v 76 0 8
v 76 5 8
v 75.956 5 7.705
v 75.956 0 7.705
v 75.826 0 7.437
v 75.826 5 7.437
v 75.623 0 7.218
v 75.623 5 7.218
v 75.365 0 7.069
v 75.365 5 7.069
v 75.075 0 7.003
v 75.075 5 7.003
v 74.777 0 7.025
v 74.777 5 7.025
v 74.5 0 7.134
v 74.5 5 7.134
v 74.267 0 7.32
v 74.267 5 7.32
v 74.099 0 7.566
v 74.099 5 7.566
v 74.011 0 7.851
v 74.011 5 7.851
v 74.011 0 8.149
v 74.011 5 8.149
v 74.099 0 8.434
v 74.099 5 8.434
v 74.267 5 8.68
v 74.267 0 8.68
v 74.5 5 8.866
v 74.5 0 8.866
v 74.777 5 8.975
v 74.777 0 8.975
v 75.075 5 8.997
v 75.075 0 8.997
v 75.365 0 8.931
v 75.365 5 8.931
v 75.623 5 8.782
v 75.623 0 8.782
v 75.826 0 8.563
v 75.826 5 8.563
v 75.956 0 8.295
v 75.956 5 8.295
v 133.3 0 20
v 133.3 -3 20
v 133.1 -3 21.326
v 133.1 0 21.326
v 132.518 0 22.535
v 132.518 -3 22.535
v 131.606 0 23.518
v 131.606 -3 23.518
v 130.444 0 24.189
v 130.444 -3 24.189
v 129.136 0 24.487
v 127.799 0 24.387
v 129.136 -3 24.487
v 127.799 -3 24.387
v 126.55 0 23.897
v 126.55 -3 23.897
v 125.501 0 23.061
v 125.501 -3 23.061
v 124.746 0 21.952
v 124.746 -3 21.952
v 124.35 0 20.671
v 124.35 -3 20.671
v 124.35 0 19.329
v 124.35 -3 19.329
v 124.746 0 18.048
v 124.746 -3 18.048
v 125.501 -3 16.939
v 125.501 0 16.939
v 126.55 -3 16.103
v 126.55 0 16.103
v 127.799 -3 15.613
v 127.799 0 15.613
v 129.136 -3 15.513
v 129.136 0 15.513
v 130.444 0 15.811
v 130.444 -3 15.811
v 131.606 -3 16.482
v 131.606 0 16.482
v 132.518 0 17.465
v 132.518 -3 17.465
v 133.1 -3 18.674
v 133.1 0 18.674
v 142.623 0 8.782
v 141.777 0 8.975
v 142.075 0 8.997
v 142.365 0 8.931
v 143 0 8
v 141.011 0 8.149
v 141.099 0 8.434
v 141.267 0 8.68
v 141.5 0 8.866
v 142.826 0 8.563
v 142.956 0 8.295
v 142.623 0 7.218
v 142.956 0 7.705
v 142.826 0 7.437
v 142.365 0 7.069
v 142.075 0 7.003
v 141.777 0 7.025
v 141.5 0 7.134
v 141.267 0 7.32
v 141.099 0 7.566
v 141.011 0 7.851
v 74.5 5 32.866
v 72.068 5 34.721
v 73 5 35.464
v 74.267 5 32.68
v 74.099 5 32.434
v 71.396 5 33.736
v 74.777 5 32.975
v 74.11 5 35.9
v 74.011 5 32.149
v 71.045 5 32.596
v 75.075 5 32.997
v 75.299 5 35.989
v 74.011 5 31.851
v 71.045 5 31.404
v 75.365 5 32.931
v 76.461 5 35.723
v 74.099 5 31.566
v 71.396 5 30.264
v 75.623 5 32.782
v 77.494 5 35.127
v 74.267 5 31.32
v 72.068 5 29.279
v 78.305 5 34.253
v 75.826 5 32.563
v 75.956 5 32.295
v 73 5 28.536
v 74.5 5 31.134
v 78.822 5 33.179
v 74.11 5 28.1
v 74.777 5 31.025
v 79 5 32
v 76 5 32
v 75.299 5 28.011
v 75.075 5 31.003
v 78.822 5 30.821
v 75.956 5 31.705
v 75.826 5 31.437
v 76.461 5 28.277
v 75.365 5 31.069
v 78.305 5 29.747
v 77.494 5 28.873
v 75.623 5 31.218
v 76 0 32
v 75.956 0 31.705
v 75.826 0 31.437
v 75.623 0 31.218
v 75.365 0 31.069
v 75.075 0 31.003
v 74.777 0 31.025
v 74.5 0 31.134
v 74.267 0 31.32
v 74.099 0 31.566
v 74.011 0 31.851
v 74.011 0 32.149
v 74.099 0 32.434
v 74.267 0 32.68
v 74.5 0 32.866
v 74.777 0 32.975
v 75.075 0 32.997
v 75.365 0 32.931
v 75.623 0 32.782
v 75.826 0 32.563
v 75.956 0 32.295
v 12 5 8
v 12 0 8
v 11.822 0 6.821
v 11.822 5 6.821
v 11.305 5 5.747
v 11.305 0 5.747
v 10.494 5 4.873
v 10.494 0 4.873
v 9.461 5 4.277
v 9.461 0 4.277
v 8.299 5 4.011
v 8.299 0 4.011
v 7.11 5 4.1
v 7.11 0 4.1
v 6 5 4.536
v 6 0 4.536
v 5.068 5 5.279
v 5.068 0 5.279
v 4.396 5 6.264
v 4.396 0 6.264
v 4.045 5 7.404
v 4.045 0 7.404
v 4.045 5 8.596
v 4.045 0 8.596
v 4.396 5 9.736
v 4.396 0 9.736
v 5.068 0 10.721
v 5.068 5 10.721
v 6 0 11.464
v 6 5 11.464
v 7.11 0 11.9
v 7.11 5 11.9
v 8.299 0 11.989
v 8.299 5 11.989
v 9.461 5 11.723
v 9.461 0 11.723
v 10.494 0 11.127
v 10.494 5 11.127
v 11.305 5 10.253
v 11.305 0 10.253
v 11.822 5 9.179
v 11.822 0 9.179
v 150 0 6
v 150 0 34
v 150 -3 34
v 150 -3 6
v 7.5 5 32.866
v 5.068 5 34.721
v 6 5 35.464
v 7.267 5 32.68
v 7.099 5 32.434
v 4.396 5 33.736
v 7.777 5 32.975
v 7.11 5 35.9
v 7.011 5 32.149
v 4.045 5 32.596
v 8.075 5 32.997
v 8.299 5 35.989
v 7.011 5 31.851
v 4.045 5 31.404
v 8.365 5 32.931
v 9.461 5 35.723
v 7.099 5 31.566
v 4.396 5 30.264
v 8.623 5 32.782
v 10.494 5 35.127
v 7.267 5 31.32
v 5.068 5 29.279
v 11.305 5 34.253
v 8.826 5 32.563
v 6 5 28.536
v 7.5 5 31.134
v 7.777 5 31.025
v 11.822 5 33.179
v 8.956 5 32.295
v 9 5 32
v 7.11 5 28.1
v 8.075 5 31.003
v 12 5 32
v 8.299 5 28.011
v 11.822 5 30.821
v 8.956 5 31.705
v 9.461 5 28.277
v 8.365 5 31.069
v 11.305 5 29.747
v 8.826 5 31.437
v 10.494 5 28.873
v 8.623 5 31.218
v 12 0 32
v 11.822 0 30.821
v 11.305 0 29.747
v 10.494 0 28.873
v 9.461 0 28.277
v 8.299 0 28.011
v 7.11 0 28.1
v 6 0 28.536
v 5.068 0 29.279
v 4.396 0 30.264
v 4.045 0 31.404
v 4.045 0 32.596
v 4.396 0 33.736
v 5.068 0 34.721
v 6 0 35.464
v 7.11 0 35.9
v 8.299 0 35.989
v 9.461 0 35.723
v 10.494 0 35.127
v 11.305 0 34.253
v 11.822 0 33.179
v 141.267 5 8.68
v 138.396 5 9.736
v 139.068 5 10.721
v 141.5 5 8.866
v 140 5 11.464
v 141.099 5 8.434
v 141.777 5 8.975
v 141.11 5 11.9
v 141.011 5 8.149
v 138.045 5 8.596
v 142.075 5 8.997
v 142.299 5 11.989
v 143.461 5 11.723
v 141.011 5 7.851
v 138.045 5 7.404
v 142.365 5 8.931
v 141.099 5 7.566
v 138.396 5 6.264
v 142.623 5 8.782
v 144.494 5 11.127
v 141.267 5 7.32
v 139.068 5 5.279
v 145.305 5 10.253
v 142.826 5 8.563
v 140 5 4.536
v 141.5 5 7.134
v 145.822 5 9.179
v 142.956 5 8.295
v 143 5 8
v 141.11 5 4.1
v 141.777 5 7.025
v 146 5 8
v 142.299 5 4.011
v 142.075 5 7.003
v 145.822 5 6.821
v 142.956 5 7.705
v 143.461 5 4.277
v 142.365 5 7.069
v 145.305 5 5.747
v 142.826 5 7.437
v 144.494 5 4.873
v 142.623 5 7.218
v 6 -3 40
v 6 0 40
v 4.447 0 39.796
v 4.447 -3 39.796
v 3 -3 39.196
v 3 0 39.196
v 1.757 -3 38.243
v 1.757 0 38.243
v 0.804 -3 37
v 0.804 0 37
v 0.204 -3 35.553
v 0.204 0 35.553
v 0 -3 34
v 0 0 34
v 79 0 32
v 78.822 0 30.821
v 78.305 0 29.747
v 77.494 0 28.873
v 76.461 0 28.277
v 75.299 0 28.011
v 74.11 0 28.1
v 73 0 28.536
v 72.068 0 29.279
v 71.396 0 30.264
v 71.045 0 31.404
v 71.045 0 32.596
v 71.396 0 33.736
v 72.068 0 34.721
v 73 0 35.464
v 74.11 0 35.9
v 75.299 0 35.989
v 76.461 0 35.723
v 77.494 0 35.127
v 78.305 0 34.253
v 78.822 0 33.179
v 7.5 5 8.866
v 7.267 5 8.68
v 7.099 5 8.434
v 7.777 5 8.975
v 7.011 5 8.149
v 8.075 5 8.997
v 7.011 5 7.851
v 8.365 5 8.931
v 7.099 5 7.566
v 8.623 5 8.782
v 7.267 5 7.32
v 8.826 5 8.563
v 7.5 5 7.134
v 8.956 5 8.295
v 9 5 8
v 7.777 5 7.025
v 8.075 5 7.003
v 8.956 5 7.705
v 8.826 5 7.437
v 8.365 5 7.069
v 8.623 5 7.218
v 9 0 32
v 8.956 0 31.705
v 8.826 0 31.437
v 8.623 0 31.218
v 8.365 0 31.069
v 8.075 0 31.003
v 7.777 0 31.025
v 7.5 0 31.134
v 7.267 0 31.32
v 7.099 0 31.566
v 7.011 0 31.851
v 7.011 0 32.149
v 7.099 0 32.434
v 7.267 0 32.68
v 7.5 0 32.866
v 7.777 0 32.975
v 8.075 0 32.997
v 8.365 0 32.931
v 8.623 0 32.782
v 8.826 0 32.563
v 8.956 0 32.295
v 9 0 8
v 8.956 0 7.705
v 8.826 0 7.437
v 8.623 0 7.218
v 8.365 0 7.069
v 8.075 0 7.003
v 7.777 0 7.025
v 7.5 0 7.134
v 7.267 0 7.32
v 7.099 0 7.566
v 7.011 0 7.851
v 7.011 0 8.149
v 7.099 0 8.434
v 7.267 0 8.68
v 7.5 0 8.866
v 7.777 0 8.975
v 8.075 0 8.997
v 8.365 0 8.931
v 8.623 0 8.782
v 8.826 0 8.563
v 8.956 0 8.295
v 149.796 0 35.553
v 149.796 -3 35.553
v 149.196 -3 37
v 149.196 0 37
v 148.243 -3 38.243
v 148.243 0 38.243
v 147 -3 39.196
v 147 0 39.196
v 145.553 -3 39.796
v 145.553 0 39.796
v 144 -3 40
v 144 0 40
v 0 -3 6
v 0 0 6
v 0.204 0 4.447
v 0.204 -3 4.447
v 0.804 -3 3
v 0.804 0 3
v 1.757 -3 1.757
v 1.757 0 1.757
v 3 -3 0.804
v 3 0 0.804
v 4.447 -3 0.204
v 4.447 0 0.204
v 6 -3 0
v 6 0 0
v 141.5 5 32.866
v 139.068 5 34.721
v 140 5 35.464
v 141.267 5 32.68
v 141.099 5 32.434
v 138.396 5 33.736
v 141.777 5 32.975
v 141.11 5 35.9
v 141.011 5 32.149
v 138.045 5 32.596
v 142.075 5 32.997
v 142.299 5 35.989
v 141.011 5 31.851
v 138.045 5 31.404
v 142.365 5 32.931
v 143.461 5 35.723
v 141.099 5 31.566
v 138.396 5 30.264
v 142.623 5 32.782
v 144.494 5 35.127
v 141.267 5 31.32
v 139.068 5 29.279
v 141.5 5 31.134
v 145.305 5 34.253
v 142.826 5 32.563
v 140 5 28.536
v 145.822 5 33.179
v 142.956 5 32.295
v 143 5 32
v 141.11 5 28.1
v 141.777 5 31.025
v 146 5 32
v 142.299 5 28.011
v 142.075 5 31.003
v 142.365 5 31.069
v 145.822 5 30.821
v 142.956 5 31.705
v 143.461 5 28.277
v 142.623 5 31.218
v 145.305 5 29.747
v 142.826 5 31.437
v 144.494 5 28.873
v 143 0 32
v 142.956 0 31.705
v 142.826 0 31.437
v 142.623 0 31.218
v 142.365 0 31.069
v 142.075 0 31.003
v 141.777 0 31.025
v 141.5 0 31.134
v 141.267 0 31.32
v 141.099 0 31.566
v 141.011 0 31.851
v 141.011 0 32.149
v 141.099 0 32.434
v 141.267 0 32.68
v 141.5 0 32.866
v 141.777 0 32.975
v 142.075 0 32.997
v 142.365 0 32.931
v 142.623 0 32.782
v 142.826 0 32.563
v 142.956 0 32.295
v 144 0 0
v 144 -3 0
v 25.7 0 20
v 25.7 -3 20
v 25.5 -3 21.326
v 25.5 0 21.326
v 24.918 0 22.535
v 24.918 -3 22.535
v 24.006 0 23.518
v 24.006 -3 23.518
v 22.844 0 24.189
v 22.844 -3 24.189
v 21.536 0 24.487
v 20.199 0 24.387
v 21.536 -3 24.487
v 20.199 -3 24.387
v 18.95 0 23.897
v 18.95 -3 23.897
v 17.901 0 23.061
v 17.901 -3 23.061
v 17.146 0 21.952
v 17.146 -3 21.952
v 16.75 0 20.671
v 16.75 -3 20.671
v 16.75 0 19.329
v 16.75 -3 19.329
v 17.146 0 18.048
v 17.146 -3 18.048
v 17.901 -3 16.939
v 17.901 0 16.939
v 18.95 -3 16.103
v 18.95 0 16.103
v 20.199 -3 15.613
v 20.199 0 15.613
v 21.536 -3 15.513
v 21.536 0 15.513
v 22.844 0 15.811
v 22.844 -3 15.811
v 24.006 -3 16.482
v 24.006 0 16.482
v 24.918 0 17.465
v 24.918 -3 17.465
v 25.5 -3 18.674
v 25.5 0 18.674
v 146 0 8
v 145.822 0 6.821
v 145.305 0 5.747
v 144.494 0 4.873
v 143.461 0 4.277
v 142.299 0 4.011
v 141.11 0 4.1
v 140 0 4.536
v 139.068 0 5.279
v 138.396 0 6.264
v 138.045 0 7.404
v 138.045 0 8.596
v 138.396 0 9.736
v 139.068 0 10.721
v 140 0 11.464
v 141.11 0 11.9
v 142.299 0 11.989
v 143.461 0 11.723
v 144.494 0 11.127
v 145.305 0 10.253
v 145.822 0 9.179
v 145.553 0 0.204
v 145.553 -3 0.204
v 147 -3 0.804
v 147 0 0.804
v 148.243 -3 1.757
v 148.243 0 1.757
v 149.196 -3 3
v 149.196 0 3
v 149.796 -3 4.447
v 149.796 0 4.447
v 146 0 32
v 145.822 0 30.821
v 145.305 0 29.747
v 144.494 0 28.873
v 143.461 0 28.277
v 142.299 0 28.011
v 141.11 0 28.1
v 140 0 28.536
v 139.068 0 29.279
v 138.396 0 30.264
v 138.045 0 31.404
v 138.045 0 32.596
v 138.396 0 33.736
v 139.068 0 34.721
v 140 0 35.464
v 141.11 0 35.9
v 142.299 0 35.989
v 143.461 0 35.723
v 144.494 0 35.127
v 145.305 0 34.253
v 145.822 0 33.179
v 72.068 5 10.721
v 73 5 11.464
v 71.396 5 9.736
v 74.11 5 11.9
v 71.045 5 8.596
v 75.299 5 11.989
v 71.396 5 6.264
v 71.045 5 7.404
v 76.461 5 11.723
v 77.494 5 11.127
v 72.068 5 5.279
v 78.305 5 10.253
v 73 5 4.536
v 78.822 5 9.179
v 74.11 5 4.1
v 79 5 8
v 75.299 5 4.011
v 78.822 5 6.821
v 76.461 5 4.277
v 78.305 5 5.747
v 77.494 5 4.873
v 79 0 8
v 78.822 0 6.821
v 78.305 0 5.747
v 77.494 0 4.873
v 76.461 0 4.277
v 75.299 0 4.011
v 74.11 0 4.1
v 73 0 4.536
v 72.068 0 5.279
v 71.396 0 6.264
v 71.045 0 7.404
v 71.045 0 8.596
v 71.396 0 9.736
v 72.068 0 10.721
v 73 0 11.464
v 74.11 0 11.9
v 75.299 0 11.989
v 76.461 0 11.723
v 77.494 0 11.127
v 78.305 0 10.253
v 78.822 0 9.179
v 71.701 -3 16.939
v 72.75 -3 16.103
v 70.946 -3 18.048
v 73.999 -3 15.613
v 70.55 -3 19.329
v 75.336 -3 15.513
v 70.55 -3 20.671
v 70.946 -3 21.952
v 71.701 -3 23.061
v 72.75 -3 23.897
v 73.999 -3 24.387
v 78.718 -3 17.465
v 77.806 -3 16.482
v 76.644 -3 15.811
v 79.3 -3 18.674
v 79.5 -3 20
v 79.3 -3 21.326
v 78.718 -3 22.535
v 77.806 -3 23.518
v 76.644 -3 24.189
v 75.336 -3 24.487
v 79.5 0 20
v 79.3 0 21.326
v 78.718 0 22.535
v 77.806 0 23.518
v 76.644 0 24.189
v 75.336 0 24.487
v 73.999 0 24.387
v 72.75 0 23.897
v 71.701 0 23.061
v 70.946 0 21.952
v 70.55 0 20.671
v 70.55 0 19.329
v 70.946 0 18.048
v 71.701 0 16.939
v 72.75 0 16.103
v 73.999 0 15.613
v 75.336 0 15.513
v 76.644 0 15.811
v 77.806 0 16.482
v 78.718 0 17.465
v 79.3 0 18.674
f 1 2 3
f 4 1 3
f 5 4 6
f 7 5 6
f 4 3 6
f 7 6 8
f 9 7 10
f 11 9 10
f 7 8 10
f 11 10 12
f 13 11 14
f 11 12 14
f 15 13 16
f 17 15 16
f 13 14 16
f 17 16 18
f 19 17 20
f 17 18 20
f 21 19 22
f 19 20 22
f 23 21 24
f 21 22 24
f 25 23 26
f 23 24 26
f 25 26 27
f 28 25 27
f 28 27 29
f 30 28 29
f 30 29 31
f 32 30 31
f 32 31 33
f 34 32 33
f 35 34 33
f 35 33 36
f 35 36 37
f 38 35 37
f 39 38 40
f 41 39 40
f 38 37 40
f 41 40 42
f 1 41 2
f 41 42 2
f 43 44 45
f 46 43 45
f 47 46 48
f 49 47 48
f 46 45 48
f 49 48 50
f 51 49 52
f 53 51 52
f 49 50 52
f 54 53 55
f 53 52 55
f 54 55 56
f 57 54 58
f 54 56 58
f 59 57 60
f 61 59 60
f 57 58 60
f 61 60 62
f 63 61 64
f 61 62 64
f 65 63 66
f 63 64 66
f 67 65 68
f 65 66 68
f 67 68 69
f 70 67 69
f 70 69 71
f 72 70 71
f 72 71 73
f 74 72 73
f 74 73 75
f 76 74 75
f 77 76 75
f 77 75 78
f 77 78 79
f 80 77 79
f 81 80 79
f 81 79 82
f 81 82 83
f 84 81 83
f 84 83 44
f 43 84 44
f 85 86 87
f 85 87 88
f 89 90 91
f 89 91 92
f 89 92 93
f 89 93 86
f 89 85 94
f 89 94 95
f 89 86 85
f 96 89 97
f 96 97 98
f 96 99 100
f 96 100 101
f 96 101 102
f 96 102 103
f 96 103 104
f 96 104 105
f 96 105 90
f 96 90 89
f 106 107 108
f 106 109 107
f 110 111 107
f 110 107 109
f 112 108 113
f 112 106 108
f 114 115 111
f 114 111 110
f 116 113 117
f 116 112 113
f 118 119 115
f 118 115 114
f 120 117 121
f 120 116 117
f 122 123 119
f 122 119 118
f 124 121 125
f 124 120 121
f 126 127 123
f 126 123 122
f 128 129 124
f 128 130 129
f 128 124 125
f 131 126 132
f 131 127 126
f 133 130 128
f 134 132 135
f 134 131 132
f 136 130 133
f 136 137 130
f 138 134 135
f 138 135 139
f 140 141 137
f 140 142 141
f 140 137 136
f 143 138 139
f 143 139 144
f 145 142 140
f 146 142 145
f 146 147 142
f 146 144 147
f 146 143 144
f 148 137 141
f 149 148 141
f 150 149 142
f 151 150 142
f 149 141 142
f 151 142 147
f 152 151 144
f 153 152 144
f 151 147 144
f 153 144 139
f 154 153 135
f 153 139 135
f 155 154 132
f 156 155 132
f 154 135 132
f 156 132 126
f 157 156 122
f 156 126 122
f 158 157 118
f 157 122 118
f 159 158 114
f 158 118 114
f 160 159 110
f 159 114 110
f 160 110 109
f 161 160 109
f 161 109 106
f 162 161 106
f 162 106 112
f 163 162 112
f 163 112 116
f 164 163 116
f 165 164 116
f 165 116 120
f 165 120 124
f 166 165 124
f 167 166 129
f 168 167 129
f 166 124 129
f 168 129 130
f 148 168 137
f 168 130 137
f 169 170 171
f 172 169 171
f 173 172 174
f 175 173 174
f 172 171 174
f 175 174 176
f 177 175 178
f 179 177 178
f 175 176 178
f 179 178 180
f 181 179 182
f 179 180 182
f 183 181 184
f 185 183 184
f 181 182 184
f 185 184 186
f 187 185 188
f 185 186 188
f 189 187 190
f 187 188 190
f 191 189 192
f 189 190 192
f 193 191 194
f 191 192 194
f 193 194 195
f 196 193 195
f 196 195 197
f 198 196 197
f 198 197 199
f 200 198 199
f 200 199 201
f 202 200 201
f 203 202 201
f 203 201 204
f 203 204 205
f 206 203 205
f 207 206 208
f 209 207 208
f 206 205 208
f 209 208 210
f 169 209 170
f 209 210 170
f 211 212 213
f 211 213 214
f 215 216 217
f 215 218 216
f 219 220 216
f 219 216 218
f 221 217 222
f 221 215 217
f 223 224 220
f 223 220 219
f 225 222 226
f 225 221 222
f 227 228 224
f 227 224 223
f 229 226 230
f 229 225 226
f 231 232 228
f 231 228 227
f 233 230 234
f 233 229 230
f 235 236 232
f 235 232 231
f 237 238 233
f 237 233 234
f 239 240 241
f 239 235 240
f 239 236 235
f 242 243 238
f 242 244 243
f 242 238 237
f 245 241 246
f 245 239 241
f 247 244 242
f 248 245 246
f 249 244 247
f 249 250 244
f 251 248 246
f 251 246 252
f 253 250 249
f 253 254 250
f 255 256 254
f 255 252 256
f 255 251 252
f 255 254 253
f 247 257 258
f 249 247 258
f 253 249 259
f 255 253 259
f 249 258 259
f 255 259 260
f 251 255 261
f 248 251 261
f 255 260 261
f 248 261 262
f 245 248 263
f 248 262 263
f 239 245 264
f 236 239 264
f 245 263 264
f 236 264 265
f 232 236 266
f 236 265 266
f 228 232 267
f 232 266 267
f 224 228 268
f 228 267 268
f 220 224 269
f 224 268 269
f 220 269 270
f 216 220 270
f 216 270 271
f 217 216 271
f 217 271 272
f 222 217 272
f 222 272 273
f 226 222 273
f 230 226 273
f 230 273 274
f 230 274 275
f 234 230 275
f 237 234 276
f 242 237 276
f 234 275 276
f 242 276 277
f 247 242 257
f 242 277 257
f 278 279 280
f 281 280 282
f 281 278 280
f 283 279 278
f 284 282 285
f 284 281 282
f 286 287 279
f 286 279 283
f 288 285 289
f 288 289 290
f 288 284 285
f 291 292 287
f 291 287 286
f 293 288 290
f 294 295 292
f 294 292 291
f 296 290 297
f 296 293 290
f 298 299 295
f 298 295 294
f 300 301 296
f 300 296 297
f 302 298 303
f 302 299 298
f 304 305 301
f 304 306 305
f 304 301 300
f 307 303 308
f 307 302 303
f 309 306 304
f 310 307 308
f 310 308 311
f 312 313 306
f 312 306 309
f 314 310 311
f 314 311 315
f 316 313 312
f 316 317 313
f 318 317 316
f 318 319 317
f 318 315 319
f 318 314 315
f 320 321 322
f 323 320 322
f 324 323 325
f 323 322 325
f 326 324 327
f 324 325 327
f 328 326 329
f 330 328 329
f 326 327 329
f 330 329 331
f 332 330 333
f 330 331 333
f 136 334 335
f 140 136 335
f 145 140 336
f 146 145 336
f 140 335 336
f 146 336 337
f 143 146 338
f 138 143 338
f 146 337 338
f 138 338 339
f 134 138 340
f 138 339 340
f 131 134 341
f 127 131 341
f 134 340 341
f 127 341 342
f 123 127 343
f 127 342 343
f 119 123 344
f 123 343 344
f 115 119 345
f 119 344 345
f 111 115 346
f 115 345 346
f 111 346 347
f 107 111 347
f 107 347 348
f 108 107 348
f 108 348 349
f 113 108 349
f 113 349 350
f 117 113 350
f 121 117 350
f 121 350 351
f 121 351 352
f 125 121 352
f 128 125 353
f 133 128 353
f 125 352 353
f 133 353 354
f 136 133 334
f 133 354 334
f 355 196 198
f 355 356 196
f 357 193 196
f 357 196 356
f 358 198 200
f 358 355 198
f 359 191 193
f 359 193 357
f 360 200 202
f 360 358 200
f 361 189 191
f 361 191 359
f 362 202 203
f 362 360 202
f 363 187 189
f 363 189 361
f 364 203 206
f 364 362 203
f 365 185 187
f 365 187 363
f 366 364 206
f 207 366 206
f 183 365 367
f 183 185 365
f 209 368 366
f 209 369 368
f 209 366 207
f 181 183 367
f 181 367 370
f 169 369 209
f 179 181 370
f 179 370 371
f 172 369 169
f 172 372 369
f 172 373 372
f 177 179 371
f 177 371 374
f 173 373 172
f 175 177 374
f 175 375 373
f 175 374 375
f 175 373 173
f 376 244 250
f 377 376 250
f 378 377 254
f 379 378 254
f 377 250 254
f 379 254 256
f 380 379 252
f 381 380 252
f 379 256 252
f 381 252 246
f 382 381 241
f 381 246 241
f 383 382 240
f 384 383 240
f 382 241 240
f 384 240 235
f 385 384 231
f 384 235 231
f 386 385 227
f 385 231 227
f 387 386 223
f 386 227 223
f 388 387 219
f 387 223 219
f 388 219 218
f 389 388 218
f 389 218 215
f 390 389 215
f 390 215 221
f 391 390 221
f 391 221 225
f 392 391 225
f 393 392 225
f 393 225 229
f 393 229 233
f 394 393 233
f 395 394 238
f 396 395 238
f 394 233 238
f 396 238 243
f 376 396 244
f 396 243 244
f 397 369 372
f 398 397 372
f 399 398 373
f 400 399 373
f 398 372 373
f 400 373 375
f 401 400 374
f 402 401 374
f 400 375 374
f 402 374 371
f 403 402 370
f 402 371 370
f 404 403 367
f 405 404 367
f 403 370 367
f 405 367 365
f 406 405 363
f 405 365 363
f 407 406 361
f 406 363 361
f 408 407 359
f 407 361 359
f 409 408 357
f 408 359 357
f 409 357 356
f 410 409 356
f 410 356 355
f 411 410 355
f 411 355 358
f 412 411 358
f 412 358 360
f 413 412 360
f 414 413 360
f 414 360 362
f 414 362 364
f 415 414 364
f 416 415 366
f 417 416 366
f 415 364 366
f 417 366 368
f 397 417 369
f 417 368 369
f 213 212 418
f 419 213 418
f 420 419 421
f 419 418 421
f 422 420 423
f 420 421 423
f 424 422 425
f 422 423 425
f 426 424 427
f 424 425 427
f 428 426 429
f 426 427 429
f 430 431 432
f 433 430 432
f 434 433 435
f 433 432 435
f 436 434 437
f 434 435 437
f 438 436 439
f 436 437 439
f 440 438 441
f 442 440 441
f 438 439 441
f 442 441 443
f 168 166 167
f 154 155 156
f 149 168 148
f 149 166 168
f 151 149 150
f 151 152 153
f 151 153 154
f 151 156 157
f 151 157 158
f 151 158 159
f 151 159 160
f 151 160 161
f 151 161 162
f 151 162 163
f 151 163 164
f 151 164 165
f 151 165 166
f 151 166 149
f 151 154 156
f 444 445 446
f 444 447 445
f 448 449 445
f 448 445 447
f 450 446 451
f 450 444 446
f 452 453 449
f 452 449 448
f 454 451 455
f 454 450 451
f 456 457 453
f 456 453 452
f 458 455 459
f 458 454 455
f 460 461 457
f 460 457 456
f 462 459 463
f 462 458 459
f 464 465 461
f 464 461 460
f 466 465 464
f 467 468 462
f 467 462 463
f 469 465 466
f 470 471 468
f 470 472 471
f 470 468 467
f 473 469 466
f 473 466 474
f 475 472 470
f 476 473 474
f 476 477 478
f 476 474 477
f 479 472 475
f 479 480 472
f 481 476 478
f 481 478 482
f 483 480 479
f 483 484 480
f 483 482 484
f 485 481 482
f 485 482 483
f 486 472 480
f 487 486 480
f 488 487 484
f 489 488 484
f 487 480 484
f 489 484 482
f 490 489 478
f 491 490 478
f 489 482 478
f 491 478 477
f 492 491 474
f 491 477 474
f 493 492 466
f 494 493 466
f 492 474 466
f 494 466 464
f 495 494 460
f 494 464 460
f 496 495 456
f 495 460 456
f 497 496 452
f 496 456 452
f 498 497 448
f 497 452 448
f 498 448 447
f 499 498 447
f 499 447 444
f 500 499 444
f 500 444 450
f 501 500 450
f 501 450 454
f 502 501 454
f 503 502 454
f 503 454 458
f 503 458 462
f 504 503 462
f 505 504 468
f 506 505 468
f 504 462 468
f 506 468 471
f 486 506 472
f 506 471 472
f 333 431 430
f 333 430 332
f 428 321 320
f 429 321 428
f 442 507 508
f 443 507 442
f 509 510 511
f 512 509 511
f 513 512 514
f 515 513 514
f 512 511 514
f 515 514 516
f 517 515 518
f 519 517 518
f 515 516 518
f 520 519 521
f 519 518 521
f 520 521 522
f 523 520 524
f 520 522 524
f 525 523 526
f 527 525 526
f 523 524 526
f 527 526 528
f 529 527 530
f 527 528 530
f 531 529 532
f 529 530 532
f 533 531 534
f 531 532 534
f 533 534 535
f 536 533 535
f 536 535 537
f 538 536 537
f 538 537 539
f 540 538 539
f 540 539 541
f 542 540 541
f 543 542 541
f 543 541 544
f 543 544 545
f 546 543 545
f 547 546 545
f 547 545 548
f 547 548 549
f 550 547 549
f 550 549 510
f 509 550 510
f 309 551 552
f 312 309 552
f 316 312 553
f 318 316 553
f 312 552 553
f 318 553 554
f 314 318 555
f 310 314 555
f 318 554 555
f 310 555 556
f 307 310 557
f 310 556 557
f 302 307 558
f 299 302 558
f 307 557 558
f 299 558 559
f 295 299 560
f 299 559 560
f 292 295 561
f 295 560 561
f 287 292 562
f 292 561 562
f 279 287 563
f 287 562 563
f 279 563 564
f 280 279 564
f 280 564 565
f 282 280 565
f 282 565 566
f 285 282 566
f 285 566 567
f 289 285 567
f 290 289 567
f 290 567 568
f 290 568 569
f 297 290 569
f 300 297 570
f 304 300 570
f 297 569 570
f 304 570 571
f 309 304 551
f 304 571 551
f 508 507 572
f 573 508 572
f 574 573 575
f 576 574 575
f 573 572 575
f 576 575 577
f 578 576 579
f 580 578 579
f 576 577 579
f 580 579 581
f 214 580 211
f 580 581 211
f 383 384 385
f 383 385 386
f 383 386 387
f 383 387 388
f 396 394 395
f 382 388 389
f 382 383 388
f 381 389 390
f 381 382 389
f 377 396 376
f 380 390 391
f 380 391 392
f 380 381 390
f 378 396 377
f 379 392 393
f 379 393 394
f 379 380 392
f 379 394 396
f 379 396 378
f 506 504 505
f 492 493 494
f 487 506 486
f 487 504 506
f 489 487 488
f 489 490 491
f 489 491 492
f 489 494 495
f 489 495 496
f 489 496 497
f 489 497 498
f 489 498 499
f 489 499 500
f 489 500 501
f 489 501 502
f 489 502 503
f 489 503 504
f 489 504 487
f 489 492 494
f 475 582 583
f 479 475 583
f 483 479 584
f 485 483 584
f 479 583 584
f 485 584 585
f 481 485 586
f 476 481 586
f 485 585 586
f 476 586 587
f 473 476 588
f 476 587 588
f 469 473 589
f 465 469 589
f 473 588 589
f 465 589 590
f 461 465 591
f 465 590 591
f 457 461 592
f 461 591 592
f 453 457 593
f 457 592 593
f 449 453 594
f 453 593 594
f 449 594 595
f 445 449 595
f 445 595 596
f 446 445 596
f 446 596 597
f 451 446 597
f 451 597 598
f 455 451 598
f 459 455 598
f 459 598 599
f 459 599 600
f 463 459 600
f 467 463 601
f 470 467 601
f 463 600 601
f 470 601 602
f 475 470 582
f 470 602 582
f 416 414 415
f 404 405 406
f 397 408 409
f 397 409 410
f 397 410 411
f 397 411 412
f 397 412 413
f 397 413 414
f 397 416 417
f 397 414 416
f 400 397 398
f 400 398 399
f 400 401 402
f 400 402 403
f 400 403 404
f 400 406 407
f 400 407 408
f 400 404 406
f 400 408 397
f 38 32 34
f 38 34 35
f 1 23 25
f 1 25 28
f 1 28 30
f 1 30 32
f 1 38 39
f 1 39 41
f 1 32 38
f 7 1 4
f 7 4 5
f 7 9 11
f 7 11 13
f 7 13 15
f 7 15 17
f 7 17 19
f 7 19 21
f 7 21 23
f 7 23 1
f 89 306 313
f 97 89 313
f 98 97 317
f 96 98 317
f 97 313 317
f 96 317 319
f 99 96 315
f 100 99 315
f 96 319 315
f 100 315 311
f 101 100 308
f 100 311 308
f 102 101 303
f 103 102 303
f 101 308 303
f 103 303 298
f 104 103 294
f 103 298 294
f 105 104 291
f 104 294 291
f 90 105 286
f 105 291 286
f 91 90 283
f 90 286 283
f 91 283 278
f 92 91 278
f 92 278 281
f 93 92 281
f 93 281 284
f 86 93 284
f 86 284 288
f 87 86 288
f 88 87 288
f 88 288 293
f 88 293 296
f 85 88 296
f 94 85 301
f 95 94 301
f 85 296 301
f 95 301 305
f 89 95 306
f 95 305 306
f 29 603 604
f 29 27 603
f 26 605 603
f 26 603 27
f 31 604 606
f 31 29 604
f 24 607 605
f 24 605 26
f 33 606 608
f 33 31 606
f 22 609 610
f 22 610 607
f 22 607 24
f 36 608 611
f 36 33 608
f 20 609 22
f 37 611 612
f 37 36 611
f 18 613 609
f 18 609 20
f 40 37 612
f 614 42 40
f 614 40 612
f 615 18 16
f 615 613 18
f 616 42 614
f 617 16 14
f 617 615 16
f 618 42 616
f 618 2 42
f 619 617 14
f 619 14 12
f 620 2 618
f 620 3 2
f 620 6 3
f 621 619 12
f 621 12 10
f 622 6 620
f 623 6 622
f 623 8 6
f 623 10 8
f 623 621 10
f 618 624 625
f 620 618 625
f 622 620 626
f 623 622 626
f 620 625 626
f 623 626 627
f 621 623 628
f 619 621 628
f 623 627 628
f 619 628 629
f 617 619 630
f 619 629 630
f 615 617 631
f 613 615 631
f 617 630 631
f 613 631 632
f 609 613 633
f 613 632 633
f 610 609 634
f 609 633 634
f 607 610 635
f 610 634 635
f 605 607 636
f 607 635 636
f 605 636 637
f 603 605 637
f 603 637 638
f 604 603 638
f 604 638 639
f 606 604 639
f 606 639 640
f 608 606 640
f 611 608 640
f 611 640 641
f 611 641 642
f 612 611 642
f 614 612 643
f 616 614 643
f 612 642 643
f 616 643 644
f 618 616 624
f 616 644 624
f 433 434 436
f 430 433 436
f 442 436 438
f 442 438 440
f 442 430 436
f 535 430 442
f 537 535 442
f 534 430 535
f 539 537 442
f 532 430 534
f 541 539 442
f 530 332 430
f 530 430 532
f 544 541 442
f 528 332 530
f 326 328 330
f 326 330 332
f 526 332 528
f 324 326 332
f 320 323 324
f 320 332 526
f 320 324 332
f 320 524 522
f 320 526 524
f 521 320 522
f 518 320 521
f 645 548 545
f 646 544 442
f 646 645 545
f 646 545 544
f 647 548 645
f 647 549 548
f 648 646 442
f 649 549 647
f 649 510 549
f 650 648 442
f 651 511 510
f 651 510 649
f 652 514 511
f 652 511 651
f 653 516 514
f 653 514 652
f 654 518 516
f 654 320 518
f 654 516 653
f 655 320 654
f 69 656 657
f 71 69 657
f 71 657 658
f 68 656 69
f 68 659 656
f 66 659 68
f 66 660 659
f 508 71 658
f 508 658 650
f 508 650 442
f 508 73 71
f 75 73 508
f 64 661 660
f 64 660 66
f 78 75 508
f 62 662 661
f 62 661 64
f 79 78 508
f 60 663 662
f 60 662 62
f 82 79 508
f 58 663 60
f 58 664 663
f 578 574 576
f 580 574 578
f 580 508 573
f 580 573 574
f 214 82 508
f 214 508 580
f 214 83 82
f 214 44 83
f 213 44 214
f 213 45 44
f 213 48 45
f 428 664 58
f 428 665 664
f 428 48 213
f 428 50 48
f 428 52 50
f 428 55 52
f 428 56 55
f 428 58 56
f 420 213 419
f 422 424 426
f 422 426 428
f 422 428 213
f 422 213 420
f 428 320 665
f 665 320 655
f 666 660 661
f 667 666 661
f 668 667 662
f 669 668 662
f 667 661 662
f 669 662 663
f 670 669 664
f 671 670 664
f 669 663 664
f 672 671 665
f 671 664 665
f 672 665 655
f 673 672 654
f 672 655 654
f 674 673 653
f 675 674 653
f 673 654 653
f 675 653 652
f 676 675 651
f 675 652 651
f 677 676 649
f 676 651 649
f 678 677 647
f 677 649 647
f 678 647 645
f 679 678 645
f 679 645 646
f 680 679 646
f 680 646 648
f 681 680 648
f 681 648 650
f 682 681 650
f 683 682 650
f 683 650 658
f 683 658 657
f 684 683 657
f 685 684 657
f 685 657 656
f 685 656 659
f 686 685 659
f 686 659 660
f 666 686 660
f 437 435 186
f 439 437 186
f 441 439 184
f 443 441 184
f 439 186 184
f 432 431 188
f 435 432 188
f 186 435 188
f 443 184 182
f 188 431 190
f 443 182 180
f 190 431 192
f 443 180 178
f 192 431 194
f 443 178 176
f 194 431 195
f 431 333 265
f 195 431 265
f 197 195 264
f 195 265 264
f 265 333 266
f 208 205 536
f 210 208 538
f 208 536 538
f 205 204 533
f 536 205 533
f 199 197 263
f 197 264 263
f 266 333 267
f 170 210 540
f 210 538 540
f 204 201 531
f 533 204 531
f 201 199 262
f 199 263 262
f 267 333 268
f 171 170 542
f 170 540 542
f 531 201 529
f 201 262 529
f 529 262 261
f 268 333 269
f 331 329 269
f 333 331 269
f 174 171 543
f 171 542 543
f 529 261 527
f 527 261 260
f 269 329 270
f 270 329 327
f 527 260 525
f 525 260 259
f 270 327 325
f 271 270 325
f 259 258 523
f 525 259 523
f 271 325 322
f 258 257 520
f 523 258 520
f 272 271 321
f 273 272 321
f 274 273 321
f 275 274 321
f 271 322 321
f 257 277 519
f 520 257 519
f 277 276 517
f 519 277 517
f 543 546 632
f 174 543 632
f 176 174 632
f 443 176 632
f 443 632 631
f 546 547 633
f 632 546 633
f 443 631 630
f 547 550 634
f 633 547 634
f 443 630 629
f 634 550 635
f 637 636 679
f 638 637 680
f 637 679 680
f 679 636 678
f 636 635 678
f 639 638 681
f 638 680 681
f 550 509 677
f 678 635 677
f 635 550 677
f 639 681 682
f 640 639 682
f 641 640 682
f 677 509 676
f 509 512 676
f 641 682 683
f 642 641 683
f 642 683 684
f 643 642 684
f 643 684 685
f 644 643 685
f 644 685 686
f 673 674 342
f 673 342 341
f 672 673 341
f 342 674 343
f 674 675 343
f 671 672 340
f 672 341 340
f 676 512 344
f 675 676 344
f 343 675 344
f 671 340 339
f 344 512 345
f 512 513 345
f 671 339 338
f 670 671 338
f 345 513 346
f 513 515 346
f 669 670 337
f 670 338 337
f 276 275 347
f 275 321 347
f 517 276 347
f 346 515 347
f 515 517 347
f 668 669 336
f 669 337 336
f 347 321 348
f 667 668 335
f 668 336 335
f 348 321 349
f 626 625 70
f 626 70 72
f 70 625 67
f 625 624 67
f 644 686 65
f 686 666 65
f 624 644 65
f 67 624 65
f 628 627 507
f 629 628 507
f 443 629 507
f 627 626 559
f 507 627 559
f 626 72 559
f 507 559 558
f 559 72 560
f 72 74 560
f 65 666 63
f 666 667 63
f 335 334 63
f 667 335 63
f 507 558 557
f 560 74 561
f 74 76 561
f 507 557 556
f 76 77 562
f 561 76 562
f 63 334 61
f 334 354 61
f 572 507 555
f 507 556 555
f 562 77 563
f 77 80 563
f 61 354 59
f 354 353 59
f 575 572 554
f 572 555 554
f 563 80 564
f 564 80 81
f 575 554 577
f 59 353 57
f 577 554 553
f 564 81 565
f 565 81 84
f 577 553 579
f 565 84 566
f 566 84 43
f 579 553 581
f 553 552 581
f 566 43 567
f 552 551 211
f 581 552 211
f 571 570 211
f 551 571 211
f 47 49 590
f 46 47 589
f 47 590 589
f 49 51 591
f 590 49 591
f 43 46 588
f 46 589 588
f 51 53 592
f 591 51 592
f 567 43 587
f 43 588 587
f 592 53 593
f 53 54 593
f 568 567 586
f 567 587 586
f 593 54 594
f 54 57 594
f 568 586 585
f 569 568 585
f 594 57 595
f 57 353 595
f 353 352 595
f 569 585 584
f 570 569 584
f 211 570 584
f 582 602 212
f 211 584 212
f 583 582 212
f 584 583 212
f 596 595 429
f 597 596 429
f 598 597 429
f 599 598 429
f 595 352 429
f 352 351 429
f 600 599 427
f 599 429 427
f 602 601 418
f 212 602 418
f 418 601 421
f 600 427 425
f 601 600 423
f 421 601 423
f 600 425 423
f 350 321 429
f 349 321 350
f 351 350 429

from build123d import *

# Parameters (mm, degrees)
PAD_DEPTH       = 3
SKETCH001_R     = 4
PAD001_DEPTH    = 5
SKETCH002_R     = 4.5
POCKET_DEPTH    = 8.001
SKETCH003_R     = 1
POCKET001_DEPTH = 5


with BuildPart() as part:
    # Sketch → Pad (new body)
    with BuildSketch(Plane.XZ):
        with BuildLine():
            ThreePointArc((6, 40), (1.757359, 38.242641), (0, 34))
            Line((0, 6), (0, 34))
            ThreePointArc((0, 6), (1.757359, 1.757359), (6, 0))
            Line((144, 0), (6, 0))
            ThreePointArc((144, 0), (148.242641, 1.757359), (150, 6))
            Line((150, 34), (150, 6))
            ThreePointArc((150, 34), (148.242641, 38.242641), (144, 40))
            Line((6, 40), (144, 40))
        make_face()
    extrude(amount=PAD_DEPTH)

    # Sketch001 (on Face9 of Pad) → Pad001 (join)
    with BuildSketch(Plane(origin=(0, 0, 0), x_dir=(1, 0, 0), z_dir=(0, 1, 0))):
        with Locations((8, -8)):
            Circle(SKETCH001_R)
        with Locations((8, -32)):
            Circle(SKETCH001_R)
        with Locations((142, -8)):
            Circle(SKETCH001_R)
        with Locations((142, -32)):
            Circle(SKETCH001_R)
        with Locations((75, -8)):
            Circle(SKETCH001_R)
        with Locations((75, -32)):
            Circle(SKETCH001_R)
    extrude(amount=PAD001_DEPTH)

    # Sketch002 (on Face5 of Pad001) → Pocket (cut, through all)
    with BuildSketch(Plane.XZ.offset(3)):
        with Locations((21.2, 20)):
            Circle(SKETCH002_R)
        with Locations((75, 20)):
            Circle(SKETCH002_R)
        with Locations((128.8, 20)):
            Circle(SKETCH002_R)
    extrude(amount=-POCKET_DEPTH, mode=Mode.SUBTRACT)

    # Sketch003 (on Face25 of Pocket) → Pocket001 (cut)
    with BuildSketch(Plane(origin=(0, 5, 0), x_dir=(1, 0, 0), z_dir=(0, 1, 0))):
        with Locations((8, -8)):
            Circle(SKETCH003_R)
        with Locations((8, -32)):
            Circle(SKETCH003_R)
        with Locations((75, -32)):
            Circle(SKETCH003_R)
        with Locations((142, -32)):
            Circle(SKETCH003_R)
        with Locations((75, -8)):
            Circle(SKETCH003_R)
        with Locations((142, -8)):
            Circle(SKETCH003_R)
    extrude(amount=-POCKET001_DEPTH, mode=Mode.SUBTRACT)


solid = part.part
